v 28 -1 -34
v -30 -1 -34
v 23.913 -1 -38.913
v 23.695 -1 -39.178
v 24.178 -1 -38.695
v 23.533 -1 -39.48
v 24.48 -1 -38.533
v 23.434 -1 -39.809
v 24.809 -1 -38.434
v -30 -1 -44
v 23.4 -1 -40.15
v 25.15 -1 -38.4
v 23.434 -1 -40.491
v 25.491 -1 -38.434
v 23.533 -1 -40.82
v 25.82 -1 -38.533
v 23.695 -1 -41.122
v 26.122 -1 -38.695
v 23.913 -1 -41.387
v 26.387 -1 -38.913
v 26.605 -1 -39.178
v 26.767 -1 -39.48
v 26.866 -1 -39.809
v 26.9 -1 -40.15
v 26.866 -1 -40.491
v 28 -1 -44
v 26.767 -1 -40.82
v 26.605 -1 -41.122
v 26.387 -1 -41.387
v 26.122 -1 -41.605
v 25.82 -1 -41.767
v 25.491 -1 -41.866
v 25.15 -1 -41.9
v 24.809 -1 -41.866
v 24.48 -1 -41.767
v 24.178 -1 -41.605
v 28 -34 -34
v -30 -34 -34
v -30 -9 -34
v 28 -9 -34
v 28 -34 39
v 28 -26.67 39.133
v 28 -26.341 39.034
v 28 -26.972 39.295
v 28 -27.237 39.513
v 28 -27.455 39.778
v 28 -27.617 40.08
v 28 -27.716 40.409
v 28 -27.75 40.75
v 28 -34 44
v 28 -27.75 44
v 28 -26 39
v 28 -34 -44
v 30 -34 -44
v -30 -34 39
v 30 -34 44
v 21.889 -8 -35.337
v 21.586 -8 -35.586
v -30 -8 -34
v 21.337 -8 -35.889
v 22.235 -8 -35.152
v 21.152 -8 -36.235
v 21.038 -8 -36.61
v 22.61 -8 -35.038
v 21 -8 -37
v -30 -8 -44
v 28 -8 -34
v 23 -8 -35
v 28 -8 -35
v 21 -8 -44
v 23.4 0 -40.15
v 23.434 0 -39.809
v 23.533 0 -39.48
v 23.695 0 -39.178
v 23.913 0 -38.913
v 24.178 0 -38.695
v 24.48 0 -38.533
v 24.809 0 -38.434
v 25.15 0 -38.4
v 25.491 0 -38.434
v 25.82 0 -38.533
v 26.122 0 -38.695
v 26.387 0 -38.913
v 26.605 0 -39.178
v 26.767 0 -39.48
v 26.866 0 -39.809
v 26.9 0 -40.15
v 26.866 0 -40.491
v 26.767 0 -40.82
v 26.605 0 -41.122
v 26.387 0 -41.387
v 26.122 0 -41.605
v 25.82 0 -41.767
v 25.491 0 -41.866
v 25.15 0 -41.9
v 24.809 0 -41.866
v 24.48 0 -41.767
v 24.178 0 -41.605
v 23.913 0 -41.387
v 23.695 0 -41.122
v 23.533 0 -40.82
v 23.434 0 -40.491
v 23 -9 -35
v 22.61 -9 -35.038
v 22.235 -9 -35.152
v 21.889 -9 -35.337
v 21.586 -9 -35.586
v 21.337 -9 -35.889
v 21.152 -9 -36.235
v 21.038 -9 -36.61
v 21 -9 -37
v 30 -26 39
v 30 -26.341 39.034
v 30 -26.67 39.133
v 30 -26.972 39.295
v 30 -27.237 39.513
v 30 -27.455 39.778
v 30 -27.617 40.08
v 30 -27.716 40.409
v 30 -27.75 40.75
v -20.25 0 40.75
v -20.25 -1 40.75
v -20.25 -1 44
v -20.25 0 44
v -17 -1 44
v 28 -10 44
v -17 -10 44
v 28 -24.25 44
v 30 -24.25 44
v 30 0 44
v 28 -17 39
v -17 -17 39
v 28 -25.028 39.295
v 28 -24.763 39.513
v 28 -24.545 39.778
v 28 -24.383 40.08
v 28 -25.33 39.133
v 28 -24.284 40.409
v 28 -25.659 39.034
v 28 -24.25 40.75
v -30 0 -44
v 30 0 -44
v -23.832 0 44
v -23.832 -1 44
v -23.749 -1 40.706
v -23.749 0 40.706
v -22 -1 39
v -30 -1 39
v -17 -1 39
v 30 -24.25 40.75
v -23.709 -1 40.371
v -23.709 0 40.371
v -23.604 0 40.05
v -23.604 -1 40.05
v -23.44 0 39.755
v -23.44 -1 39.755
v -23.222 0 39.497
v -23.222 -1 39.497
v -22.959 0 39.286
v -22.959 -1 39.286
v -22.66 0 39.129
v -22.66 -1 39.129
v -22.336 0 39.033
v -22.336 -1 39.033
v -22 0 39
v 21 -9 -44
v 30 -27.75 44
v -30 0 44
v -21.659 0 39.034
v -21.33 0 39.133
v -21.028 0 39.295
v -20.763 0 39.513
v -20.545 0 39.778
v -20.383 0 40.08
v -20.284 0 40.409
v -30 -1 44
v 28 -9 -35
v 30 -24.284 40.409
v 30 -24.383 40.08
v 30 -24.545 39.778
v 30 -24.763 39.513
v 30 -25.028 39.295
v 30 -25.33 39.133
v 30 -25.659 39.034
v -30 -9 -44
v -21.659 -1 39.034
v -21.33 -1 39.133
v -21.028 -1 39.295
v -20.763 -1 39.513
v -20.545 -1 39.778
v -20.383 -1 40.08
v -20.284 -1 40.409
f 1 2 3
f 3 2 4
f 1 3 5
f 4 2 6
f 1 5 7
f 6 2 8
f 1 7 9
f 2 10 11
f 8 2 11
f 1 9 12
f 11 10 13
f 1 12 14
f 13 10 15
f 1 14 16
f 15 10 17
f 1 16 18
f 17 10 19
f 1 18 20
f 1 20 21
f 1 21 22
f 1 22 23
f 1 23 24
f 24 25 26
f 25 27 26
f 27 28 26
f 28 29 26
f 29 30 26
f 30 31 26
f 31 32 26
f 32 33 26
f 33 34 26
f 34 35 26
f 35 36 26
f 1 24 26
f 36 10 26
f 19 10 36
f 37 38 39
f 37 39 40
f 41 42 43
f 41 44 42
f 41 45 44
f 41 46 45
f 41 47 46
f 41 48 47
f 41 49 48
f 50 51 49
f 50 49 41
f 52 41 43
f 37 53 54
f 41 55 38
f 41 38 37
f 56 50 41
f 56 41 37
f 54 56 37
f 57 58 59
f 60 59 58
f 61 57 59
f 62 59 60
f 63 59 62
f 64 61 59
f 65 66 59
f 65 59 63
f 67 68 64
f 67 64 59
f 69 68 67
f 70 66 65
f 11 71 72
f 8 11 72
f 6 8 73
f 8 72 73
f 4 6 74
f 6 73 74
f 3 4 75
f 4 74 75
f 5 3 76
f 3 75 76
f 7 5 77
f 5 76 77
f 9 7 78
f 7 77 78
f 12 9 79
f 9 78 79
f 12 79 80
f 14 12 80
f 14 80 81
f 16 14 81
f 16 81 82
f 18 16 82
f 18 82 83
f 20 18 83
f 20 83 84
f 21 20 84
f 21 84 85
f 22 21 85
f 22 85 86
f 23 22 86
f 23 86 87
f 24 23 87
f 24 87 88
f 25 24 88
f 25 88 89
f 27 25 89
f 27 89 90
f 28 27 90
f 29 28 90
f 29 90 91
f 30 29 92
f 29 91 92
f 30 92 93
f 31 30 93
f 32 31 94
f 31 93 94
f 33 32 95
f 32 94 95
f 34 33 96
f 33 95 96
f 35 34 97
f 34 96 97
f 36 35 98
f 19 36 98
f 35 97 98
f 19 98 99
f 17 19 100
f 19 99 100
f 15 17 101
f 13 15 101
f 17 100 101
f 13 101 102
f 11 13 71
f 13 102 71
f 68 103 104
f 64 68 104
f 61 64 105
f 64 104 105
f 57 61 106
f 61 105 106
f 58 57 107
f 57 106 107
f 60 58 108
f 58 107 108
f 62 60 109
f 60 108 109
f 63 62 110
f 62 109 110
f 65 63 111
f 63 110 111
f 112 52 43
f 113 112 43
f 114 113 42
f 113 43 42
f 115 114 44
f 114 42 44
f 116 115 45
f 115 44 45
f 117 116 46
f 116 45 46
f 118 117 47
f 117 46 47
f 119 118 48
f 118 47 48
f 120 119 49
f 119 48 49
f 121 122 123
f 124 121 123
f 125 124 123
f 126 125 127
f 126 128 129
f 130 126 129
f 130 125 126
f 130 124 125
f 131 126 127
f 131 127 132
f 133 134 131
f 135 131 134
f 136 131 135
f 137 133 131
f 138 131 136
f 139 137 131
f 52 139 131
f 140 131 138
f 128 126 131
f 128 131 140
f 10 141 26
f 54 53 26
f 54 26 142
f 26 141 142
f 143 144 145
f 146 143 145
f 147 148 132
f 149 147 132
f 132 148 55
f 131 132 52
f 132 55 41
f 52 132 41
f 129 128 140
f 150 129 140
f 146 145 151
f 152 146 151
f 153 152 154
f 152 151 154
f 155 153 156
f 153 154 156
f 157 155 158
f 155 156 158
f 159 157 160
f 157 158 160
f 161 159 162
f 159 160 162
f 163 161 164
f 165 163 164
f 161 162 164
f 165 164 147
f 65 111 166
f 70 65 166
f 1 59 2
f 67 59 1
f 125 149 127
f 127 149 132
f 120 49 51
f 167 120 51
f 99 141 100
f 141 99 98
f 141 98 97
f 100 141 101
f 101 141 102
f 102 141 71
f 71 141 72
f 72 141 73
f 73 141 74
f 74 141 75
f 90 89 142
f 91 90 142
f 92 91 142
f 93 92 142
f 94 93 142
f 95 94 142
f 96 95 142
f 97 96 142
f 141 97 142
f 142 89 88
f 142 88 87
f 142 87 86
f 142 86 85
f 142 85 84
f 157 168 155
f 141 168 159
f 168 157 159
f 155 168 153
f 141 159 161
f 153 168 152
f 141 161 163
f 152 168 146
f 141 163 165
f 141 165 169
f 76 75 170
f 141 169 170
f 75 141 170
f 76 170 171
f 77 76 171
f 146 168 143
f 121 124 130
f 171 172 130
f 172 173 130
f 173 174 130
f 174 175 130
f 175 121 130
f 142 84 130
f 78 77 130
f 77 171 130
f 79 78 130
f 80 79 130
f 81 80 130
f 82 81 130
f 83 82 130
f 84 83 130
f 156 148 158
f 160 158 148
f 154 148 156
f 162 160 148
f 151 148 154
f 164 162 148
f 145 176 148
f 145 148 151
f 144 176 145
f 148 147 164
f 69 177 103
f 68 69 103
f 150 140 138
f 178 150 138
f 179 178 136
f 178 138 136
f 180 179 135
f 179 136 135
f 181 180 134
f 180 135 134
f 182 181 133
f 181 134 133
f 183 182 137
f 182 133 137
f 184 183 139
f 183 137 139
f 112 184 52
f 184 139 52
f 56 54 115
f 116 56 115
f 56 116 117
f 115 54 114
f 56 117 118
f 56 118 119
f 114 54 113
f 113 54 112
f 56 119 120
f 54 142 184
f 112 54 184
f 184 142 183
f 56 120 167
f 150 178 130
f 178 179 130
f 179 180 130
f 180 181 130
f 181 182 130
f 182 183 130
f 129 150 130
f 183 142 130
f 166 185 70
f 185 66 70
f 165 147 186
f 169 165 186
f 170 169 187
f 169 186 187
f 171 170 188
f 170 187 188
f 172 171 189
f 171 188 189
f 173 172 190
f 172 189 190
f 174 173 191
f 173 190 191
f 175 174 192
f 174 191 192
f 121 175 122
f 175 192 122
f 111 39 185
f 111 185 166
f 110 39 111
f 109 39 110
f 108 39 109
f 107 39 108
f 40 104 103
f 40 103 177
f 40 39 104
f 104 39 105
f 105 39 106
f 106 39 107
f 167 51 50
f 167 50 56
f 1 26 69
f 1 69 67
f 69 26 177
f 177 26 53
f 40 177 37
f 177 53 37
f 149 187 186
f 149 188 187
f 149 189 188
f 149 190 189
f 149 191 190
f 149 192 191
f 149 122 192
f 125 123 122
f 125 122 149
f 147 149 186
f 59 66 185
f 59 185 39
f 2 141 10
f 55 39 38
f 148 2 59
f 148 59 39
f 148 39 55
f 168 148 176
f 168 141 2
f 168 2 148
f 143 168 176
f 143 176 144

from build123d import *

# Parameters (mm, degrees)
F0_W      = 60
F0_H      = 88
F1_DEPTH  = 34
F3_DEPTH  = 58
F4_W      = 13
F4_H      = 5
F5_DEPTH  = 33
F7_DEPTH  = 1.001
F9_DEPTH  = 2.001
F4_W_2    = 58
F4_H_2    = 10
F10_DEPTH = 25
F11_W     = 58
F11_H     = 7
F12_DEPTH = 10
F14_DEPTH = 3
F15_R     = 1.75
F16_DEPTH = 3


with BuildPart() as f1:
    # F0 (on Front) → F1 (new body)
    with BuildSketch(Plane.XZ):
        Rectangle(F0_W, F0_H)
    extrude(amount=F1_DEPTH)

    # F2 (on face) → F3 (cut)
    with BuildSketch(Plane(origin=(-30, 0, 0), x_dir=(0, -1, 0), z_dir=(-1, 0, 0))):
        Polygon((34, 39), (34, 44), (10, 44), (17, 39), align=None)
    extrude(amount=-F3_DEPTH, mode=Mode.SUBTRACT)

    # F4 (on face) → F5 (cut)
    with BuildSketch(Plane.XZ.offset(34)):
        with Locations((-23.5, 41.5)):
            Rectangle(F4_W, F4_H)
    extrude(amount=-F5_DEPTH, mode=Mode.SUBTRACT)

    # F6 (on face) → F7 (cut, through all)
    with BuildSketch(Plane.XZ.offset(1)):
        with BuildLine():
            Line((-23.831531967, 44), (-23.7494568899, 40.7064042404))
            ThreePointArc((-23.7494568899, 40.7064042404), (-23.2219262295, 39.4972445212), (-22, 39))
            ThreePointArc((-22, 39), (-20.7625631329, 39.5125631329), (-20.25, 40.75))
            Line((-20.25, 40.75), (-20.25, 44))
            Line((-20.25, 44), (-23.831531967, 44))
        make_face()
    extrude(amount=-F7_DEPTH, mode=Mode.SUBTRACT)

    # F8 (on face) → F9 (cut, through all)
    with BuildSketch(Plane(origin=(28, 0, 0), x_dir=(0, -1, 0), z_dir=(-1, 0, 0))):
        with BuildLine():
            Line((24.25, 44), (24.25, 40.75))
            ThreePointArc((24.25, 40.75), (24.7625631329, 39.5125631329), (26, 39))
            ThreePointArc((26, 39), (27.2374368671, 39.5125631329), (27.75, 40.75))
            Line((27.75, 40.75), (27.75, 44))
            Line((27.75, 44), (24.25, 44))
        make_face()
    extrude(amount=-F9_DEPTH, mode=Mode.SUBTRACT)

    # F4 (on face) → F10 (cut)
    with BuildSketch(Plane.XZ.offset(34)):
        with Locations((-1, -39)):
            Rectangle(F4_W_2, F4_H_2)
    extrude(amount=-F10_DEPTH, mode=Mode.SUBTRACT)

    # F11 (on face) → F12 (cut)
    with BuildSketch(Plane(origin=(0, 0, -44), x_dir=(1, 0, 0), z_dir=(0, 0, -1))):
        with Locations((-1, 4.5)):
            Rectangle(F11_W, F11_H)
    extrude(amount=-F12_DEPTH, mode=Mode.SUBTRACT)

    # F13 (on face) → F14 (cut)
    with BuildSketch(Plane.XZ.offset(9)):
        with BuildLine():
            Line((21, -37), (21, -44))
            Line((21, -44), (28, -44))
            Line((28, -44), (28, -35))
            Line((28, -35), (23, -35))
            ThreePointArc((23, -35), (21.5857864376, -35.5857864376), (21, -37))
        make_face()
    extrude(amount=-F14_DEPTH, mode=Mode.SUBTRACT)

    # F15 (on face) → F16 (cut)
    with BuildSketch(Plane(origin=(0, 0, 0), x_dir=(-1, 0, 0), z_dir=(0, 1, 0))):
        with Locations((-25.15, -40.15)):
            Circle(F15_R)
    extrude(amount=-F16_DEPTH, mode=Mode.SUBTRACT)


solid = f1.part
